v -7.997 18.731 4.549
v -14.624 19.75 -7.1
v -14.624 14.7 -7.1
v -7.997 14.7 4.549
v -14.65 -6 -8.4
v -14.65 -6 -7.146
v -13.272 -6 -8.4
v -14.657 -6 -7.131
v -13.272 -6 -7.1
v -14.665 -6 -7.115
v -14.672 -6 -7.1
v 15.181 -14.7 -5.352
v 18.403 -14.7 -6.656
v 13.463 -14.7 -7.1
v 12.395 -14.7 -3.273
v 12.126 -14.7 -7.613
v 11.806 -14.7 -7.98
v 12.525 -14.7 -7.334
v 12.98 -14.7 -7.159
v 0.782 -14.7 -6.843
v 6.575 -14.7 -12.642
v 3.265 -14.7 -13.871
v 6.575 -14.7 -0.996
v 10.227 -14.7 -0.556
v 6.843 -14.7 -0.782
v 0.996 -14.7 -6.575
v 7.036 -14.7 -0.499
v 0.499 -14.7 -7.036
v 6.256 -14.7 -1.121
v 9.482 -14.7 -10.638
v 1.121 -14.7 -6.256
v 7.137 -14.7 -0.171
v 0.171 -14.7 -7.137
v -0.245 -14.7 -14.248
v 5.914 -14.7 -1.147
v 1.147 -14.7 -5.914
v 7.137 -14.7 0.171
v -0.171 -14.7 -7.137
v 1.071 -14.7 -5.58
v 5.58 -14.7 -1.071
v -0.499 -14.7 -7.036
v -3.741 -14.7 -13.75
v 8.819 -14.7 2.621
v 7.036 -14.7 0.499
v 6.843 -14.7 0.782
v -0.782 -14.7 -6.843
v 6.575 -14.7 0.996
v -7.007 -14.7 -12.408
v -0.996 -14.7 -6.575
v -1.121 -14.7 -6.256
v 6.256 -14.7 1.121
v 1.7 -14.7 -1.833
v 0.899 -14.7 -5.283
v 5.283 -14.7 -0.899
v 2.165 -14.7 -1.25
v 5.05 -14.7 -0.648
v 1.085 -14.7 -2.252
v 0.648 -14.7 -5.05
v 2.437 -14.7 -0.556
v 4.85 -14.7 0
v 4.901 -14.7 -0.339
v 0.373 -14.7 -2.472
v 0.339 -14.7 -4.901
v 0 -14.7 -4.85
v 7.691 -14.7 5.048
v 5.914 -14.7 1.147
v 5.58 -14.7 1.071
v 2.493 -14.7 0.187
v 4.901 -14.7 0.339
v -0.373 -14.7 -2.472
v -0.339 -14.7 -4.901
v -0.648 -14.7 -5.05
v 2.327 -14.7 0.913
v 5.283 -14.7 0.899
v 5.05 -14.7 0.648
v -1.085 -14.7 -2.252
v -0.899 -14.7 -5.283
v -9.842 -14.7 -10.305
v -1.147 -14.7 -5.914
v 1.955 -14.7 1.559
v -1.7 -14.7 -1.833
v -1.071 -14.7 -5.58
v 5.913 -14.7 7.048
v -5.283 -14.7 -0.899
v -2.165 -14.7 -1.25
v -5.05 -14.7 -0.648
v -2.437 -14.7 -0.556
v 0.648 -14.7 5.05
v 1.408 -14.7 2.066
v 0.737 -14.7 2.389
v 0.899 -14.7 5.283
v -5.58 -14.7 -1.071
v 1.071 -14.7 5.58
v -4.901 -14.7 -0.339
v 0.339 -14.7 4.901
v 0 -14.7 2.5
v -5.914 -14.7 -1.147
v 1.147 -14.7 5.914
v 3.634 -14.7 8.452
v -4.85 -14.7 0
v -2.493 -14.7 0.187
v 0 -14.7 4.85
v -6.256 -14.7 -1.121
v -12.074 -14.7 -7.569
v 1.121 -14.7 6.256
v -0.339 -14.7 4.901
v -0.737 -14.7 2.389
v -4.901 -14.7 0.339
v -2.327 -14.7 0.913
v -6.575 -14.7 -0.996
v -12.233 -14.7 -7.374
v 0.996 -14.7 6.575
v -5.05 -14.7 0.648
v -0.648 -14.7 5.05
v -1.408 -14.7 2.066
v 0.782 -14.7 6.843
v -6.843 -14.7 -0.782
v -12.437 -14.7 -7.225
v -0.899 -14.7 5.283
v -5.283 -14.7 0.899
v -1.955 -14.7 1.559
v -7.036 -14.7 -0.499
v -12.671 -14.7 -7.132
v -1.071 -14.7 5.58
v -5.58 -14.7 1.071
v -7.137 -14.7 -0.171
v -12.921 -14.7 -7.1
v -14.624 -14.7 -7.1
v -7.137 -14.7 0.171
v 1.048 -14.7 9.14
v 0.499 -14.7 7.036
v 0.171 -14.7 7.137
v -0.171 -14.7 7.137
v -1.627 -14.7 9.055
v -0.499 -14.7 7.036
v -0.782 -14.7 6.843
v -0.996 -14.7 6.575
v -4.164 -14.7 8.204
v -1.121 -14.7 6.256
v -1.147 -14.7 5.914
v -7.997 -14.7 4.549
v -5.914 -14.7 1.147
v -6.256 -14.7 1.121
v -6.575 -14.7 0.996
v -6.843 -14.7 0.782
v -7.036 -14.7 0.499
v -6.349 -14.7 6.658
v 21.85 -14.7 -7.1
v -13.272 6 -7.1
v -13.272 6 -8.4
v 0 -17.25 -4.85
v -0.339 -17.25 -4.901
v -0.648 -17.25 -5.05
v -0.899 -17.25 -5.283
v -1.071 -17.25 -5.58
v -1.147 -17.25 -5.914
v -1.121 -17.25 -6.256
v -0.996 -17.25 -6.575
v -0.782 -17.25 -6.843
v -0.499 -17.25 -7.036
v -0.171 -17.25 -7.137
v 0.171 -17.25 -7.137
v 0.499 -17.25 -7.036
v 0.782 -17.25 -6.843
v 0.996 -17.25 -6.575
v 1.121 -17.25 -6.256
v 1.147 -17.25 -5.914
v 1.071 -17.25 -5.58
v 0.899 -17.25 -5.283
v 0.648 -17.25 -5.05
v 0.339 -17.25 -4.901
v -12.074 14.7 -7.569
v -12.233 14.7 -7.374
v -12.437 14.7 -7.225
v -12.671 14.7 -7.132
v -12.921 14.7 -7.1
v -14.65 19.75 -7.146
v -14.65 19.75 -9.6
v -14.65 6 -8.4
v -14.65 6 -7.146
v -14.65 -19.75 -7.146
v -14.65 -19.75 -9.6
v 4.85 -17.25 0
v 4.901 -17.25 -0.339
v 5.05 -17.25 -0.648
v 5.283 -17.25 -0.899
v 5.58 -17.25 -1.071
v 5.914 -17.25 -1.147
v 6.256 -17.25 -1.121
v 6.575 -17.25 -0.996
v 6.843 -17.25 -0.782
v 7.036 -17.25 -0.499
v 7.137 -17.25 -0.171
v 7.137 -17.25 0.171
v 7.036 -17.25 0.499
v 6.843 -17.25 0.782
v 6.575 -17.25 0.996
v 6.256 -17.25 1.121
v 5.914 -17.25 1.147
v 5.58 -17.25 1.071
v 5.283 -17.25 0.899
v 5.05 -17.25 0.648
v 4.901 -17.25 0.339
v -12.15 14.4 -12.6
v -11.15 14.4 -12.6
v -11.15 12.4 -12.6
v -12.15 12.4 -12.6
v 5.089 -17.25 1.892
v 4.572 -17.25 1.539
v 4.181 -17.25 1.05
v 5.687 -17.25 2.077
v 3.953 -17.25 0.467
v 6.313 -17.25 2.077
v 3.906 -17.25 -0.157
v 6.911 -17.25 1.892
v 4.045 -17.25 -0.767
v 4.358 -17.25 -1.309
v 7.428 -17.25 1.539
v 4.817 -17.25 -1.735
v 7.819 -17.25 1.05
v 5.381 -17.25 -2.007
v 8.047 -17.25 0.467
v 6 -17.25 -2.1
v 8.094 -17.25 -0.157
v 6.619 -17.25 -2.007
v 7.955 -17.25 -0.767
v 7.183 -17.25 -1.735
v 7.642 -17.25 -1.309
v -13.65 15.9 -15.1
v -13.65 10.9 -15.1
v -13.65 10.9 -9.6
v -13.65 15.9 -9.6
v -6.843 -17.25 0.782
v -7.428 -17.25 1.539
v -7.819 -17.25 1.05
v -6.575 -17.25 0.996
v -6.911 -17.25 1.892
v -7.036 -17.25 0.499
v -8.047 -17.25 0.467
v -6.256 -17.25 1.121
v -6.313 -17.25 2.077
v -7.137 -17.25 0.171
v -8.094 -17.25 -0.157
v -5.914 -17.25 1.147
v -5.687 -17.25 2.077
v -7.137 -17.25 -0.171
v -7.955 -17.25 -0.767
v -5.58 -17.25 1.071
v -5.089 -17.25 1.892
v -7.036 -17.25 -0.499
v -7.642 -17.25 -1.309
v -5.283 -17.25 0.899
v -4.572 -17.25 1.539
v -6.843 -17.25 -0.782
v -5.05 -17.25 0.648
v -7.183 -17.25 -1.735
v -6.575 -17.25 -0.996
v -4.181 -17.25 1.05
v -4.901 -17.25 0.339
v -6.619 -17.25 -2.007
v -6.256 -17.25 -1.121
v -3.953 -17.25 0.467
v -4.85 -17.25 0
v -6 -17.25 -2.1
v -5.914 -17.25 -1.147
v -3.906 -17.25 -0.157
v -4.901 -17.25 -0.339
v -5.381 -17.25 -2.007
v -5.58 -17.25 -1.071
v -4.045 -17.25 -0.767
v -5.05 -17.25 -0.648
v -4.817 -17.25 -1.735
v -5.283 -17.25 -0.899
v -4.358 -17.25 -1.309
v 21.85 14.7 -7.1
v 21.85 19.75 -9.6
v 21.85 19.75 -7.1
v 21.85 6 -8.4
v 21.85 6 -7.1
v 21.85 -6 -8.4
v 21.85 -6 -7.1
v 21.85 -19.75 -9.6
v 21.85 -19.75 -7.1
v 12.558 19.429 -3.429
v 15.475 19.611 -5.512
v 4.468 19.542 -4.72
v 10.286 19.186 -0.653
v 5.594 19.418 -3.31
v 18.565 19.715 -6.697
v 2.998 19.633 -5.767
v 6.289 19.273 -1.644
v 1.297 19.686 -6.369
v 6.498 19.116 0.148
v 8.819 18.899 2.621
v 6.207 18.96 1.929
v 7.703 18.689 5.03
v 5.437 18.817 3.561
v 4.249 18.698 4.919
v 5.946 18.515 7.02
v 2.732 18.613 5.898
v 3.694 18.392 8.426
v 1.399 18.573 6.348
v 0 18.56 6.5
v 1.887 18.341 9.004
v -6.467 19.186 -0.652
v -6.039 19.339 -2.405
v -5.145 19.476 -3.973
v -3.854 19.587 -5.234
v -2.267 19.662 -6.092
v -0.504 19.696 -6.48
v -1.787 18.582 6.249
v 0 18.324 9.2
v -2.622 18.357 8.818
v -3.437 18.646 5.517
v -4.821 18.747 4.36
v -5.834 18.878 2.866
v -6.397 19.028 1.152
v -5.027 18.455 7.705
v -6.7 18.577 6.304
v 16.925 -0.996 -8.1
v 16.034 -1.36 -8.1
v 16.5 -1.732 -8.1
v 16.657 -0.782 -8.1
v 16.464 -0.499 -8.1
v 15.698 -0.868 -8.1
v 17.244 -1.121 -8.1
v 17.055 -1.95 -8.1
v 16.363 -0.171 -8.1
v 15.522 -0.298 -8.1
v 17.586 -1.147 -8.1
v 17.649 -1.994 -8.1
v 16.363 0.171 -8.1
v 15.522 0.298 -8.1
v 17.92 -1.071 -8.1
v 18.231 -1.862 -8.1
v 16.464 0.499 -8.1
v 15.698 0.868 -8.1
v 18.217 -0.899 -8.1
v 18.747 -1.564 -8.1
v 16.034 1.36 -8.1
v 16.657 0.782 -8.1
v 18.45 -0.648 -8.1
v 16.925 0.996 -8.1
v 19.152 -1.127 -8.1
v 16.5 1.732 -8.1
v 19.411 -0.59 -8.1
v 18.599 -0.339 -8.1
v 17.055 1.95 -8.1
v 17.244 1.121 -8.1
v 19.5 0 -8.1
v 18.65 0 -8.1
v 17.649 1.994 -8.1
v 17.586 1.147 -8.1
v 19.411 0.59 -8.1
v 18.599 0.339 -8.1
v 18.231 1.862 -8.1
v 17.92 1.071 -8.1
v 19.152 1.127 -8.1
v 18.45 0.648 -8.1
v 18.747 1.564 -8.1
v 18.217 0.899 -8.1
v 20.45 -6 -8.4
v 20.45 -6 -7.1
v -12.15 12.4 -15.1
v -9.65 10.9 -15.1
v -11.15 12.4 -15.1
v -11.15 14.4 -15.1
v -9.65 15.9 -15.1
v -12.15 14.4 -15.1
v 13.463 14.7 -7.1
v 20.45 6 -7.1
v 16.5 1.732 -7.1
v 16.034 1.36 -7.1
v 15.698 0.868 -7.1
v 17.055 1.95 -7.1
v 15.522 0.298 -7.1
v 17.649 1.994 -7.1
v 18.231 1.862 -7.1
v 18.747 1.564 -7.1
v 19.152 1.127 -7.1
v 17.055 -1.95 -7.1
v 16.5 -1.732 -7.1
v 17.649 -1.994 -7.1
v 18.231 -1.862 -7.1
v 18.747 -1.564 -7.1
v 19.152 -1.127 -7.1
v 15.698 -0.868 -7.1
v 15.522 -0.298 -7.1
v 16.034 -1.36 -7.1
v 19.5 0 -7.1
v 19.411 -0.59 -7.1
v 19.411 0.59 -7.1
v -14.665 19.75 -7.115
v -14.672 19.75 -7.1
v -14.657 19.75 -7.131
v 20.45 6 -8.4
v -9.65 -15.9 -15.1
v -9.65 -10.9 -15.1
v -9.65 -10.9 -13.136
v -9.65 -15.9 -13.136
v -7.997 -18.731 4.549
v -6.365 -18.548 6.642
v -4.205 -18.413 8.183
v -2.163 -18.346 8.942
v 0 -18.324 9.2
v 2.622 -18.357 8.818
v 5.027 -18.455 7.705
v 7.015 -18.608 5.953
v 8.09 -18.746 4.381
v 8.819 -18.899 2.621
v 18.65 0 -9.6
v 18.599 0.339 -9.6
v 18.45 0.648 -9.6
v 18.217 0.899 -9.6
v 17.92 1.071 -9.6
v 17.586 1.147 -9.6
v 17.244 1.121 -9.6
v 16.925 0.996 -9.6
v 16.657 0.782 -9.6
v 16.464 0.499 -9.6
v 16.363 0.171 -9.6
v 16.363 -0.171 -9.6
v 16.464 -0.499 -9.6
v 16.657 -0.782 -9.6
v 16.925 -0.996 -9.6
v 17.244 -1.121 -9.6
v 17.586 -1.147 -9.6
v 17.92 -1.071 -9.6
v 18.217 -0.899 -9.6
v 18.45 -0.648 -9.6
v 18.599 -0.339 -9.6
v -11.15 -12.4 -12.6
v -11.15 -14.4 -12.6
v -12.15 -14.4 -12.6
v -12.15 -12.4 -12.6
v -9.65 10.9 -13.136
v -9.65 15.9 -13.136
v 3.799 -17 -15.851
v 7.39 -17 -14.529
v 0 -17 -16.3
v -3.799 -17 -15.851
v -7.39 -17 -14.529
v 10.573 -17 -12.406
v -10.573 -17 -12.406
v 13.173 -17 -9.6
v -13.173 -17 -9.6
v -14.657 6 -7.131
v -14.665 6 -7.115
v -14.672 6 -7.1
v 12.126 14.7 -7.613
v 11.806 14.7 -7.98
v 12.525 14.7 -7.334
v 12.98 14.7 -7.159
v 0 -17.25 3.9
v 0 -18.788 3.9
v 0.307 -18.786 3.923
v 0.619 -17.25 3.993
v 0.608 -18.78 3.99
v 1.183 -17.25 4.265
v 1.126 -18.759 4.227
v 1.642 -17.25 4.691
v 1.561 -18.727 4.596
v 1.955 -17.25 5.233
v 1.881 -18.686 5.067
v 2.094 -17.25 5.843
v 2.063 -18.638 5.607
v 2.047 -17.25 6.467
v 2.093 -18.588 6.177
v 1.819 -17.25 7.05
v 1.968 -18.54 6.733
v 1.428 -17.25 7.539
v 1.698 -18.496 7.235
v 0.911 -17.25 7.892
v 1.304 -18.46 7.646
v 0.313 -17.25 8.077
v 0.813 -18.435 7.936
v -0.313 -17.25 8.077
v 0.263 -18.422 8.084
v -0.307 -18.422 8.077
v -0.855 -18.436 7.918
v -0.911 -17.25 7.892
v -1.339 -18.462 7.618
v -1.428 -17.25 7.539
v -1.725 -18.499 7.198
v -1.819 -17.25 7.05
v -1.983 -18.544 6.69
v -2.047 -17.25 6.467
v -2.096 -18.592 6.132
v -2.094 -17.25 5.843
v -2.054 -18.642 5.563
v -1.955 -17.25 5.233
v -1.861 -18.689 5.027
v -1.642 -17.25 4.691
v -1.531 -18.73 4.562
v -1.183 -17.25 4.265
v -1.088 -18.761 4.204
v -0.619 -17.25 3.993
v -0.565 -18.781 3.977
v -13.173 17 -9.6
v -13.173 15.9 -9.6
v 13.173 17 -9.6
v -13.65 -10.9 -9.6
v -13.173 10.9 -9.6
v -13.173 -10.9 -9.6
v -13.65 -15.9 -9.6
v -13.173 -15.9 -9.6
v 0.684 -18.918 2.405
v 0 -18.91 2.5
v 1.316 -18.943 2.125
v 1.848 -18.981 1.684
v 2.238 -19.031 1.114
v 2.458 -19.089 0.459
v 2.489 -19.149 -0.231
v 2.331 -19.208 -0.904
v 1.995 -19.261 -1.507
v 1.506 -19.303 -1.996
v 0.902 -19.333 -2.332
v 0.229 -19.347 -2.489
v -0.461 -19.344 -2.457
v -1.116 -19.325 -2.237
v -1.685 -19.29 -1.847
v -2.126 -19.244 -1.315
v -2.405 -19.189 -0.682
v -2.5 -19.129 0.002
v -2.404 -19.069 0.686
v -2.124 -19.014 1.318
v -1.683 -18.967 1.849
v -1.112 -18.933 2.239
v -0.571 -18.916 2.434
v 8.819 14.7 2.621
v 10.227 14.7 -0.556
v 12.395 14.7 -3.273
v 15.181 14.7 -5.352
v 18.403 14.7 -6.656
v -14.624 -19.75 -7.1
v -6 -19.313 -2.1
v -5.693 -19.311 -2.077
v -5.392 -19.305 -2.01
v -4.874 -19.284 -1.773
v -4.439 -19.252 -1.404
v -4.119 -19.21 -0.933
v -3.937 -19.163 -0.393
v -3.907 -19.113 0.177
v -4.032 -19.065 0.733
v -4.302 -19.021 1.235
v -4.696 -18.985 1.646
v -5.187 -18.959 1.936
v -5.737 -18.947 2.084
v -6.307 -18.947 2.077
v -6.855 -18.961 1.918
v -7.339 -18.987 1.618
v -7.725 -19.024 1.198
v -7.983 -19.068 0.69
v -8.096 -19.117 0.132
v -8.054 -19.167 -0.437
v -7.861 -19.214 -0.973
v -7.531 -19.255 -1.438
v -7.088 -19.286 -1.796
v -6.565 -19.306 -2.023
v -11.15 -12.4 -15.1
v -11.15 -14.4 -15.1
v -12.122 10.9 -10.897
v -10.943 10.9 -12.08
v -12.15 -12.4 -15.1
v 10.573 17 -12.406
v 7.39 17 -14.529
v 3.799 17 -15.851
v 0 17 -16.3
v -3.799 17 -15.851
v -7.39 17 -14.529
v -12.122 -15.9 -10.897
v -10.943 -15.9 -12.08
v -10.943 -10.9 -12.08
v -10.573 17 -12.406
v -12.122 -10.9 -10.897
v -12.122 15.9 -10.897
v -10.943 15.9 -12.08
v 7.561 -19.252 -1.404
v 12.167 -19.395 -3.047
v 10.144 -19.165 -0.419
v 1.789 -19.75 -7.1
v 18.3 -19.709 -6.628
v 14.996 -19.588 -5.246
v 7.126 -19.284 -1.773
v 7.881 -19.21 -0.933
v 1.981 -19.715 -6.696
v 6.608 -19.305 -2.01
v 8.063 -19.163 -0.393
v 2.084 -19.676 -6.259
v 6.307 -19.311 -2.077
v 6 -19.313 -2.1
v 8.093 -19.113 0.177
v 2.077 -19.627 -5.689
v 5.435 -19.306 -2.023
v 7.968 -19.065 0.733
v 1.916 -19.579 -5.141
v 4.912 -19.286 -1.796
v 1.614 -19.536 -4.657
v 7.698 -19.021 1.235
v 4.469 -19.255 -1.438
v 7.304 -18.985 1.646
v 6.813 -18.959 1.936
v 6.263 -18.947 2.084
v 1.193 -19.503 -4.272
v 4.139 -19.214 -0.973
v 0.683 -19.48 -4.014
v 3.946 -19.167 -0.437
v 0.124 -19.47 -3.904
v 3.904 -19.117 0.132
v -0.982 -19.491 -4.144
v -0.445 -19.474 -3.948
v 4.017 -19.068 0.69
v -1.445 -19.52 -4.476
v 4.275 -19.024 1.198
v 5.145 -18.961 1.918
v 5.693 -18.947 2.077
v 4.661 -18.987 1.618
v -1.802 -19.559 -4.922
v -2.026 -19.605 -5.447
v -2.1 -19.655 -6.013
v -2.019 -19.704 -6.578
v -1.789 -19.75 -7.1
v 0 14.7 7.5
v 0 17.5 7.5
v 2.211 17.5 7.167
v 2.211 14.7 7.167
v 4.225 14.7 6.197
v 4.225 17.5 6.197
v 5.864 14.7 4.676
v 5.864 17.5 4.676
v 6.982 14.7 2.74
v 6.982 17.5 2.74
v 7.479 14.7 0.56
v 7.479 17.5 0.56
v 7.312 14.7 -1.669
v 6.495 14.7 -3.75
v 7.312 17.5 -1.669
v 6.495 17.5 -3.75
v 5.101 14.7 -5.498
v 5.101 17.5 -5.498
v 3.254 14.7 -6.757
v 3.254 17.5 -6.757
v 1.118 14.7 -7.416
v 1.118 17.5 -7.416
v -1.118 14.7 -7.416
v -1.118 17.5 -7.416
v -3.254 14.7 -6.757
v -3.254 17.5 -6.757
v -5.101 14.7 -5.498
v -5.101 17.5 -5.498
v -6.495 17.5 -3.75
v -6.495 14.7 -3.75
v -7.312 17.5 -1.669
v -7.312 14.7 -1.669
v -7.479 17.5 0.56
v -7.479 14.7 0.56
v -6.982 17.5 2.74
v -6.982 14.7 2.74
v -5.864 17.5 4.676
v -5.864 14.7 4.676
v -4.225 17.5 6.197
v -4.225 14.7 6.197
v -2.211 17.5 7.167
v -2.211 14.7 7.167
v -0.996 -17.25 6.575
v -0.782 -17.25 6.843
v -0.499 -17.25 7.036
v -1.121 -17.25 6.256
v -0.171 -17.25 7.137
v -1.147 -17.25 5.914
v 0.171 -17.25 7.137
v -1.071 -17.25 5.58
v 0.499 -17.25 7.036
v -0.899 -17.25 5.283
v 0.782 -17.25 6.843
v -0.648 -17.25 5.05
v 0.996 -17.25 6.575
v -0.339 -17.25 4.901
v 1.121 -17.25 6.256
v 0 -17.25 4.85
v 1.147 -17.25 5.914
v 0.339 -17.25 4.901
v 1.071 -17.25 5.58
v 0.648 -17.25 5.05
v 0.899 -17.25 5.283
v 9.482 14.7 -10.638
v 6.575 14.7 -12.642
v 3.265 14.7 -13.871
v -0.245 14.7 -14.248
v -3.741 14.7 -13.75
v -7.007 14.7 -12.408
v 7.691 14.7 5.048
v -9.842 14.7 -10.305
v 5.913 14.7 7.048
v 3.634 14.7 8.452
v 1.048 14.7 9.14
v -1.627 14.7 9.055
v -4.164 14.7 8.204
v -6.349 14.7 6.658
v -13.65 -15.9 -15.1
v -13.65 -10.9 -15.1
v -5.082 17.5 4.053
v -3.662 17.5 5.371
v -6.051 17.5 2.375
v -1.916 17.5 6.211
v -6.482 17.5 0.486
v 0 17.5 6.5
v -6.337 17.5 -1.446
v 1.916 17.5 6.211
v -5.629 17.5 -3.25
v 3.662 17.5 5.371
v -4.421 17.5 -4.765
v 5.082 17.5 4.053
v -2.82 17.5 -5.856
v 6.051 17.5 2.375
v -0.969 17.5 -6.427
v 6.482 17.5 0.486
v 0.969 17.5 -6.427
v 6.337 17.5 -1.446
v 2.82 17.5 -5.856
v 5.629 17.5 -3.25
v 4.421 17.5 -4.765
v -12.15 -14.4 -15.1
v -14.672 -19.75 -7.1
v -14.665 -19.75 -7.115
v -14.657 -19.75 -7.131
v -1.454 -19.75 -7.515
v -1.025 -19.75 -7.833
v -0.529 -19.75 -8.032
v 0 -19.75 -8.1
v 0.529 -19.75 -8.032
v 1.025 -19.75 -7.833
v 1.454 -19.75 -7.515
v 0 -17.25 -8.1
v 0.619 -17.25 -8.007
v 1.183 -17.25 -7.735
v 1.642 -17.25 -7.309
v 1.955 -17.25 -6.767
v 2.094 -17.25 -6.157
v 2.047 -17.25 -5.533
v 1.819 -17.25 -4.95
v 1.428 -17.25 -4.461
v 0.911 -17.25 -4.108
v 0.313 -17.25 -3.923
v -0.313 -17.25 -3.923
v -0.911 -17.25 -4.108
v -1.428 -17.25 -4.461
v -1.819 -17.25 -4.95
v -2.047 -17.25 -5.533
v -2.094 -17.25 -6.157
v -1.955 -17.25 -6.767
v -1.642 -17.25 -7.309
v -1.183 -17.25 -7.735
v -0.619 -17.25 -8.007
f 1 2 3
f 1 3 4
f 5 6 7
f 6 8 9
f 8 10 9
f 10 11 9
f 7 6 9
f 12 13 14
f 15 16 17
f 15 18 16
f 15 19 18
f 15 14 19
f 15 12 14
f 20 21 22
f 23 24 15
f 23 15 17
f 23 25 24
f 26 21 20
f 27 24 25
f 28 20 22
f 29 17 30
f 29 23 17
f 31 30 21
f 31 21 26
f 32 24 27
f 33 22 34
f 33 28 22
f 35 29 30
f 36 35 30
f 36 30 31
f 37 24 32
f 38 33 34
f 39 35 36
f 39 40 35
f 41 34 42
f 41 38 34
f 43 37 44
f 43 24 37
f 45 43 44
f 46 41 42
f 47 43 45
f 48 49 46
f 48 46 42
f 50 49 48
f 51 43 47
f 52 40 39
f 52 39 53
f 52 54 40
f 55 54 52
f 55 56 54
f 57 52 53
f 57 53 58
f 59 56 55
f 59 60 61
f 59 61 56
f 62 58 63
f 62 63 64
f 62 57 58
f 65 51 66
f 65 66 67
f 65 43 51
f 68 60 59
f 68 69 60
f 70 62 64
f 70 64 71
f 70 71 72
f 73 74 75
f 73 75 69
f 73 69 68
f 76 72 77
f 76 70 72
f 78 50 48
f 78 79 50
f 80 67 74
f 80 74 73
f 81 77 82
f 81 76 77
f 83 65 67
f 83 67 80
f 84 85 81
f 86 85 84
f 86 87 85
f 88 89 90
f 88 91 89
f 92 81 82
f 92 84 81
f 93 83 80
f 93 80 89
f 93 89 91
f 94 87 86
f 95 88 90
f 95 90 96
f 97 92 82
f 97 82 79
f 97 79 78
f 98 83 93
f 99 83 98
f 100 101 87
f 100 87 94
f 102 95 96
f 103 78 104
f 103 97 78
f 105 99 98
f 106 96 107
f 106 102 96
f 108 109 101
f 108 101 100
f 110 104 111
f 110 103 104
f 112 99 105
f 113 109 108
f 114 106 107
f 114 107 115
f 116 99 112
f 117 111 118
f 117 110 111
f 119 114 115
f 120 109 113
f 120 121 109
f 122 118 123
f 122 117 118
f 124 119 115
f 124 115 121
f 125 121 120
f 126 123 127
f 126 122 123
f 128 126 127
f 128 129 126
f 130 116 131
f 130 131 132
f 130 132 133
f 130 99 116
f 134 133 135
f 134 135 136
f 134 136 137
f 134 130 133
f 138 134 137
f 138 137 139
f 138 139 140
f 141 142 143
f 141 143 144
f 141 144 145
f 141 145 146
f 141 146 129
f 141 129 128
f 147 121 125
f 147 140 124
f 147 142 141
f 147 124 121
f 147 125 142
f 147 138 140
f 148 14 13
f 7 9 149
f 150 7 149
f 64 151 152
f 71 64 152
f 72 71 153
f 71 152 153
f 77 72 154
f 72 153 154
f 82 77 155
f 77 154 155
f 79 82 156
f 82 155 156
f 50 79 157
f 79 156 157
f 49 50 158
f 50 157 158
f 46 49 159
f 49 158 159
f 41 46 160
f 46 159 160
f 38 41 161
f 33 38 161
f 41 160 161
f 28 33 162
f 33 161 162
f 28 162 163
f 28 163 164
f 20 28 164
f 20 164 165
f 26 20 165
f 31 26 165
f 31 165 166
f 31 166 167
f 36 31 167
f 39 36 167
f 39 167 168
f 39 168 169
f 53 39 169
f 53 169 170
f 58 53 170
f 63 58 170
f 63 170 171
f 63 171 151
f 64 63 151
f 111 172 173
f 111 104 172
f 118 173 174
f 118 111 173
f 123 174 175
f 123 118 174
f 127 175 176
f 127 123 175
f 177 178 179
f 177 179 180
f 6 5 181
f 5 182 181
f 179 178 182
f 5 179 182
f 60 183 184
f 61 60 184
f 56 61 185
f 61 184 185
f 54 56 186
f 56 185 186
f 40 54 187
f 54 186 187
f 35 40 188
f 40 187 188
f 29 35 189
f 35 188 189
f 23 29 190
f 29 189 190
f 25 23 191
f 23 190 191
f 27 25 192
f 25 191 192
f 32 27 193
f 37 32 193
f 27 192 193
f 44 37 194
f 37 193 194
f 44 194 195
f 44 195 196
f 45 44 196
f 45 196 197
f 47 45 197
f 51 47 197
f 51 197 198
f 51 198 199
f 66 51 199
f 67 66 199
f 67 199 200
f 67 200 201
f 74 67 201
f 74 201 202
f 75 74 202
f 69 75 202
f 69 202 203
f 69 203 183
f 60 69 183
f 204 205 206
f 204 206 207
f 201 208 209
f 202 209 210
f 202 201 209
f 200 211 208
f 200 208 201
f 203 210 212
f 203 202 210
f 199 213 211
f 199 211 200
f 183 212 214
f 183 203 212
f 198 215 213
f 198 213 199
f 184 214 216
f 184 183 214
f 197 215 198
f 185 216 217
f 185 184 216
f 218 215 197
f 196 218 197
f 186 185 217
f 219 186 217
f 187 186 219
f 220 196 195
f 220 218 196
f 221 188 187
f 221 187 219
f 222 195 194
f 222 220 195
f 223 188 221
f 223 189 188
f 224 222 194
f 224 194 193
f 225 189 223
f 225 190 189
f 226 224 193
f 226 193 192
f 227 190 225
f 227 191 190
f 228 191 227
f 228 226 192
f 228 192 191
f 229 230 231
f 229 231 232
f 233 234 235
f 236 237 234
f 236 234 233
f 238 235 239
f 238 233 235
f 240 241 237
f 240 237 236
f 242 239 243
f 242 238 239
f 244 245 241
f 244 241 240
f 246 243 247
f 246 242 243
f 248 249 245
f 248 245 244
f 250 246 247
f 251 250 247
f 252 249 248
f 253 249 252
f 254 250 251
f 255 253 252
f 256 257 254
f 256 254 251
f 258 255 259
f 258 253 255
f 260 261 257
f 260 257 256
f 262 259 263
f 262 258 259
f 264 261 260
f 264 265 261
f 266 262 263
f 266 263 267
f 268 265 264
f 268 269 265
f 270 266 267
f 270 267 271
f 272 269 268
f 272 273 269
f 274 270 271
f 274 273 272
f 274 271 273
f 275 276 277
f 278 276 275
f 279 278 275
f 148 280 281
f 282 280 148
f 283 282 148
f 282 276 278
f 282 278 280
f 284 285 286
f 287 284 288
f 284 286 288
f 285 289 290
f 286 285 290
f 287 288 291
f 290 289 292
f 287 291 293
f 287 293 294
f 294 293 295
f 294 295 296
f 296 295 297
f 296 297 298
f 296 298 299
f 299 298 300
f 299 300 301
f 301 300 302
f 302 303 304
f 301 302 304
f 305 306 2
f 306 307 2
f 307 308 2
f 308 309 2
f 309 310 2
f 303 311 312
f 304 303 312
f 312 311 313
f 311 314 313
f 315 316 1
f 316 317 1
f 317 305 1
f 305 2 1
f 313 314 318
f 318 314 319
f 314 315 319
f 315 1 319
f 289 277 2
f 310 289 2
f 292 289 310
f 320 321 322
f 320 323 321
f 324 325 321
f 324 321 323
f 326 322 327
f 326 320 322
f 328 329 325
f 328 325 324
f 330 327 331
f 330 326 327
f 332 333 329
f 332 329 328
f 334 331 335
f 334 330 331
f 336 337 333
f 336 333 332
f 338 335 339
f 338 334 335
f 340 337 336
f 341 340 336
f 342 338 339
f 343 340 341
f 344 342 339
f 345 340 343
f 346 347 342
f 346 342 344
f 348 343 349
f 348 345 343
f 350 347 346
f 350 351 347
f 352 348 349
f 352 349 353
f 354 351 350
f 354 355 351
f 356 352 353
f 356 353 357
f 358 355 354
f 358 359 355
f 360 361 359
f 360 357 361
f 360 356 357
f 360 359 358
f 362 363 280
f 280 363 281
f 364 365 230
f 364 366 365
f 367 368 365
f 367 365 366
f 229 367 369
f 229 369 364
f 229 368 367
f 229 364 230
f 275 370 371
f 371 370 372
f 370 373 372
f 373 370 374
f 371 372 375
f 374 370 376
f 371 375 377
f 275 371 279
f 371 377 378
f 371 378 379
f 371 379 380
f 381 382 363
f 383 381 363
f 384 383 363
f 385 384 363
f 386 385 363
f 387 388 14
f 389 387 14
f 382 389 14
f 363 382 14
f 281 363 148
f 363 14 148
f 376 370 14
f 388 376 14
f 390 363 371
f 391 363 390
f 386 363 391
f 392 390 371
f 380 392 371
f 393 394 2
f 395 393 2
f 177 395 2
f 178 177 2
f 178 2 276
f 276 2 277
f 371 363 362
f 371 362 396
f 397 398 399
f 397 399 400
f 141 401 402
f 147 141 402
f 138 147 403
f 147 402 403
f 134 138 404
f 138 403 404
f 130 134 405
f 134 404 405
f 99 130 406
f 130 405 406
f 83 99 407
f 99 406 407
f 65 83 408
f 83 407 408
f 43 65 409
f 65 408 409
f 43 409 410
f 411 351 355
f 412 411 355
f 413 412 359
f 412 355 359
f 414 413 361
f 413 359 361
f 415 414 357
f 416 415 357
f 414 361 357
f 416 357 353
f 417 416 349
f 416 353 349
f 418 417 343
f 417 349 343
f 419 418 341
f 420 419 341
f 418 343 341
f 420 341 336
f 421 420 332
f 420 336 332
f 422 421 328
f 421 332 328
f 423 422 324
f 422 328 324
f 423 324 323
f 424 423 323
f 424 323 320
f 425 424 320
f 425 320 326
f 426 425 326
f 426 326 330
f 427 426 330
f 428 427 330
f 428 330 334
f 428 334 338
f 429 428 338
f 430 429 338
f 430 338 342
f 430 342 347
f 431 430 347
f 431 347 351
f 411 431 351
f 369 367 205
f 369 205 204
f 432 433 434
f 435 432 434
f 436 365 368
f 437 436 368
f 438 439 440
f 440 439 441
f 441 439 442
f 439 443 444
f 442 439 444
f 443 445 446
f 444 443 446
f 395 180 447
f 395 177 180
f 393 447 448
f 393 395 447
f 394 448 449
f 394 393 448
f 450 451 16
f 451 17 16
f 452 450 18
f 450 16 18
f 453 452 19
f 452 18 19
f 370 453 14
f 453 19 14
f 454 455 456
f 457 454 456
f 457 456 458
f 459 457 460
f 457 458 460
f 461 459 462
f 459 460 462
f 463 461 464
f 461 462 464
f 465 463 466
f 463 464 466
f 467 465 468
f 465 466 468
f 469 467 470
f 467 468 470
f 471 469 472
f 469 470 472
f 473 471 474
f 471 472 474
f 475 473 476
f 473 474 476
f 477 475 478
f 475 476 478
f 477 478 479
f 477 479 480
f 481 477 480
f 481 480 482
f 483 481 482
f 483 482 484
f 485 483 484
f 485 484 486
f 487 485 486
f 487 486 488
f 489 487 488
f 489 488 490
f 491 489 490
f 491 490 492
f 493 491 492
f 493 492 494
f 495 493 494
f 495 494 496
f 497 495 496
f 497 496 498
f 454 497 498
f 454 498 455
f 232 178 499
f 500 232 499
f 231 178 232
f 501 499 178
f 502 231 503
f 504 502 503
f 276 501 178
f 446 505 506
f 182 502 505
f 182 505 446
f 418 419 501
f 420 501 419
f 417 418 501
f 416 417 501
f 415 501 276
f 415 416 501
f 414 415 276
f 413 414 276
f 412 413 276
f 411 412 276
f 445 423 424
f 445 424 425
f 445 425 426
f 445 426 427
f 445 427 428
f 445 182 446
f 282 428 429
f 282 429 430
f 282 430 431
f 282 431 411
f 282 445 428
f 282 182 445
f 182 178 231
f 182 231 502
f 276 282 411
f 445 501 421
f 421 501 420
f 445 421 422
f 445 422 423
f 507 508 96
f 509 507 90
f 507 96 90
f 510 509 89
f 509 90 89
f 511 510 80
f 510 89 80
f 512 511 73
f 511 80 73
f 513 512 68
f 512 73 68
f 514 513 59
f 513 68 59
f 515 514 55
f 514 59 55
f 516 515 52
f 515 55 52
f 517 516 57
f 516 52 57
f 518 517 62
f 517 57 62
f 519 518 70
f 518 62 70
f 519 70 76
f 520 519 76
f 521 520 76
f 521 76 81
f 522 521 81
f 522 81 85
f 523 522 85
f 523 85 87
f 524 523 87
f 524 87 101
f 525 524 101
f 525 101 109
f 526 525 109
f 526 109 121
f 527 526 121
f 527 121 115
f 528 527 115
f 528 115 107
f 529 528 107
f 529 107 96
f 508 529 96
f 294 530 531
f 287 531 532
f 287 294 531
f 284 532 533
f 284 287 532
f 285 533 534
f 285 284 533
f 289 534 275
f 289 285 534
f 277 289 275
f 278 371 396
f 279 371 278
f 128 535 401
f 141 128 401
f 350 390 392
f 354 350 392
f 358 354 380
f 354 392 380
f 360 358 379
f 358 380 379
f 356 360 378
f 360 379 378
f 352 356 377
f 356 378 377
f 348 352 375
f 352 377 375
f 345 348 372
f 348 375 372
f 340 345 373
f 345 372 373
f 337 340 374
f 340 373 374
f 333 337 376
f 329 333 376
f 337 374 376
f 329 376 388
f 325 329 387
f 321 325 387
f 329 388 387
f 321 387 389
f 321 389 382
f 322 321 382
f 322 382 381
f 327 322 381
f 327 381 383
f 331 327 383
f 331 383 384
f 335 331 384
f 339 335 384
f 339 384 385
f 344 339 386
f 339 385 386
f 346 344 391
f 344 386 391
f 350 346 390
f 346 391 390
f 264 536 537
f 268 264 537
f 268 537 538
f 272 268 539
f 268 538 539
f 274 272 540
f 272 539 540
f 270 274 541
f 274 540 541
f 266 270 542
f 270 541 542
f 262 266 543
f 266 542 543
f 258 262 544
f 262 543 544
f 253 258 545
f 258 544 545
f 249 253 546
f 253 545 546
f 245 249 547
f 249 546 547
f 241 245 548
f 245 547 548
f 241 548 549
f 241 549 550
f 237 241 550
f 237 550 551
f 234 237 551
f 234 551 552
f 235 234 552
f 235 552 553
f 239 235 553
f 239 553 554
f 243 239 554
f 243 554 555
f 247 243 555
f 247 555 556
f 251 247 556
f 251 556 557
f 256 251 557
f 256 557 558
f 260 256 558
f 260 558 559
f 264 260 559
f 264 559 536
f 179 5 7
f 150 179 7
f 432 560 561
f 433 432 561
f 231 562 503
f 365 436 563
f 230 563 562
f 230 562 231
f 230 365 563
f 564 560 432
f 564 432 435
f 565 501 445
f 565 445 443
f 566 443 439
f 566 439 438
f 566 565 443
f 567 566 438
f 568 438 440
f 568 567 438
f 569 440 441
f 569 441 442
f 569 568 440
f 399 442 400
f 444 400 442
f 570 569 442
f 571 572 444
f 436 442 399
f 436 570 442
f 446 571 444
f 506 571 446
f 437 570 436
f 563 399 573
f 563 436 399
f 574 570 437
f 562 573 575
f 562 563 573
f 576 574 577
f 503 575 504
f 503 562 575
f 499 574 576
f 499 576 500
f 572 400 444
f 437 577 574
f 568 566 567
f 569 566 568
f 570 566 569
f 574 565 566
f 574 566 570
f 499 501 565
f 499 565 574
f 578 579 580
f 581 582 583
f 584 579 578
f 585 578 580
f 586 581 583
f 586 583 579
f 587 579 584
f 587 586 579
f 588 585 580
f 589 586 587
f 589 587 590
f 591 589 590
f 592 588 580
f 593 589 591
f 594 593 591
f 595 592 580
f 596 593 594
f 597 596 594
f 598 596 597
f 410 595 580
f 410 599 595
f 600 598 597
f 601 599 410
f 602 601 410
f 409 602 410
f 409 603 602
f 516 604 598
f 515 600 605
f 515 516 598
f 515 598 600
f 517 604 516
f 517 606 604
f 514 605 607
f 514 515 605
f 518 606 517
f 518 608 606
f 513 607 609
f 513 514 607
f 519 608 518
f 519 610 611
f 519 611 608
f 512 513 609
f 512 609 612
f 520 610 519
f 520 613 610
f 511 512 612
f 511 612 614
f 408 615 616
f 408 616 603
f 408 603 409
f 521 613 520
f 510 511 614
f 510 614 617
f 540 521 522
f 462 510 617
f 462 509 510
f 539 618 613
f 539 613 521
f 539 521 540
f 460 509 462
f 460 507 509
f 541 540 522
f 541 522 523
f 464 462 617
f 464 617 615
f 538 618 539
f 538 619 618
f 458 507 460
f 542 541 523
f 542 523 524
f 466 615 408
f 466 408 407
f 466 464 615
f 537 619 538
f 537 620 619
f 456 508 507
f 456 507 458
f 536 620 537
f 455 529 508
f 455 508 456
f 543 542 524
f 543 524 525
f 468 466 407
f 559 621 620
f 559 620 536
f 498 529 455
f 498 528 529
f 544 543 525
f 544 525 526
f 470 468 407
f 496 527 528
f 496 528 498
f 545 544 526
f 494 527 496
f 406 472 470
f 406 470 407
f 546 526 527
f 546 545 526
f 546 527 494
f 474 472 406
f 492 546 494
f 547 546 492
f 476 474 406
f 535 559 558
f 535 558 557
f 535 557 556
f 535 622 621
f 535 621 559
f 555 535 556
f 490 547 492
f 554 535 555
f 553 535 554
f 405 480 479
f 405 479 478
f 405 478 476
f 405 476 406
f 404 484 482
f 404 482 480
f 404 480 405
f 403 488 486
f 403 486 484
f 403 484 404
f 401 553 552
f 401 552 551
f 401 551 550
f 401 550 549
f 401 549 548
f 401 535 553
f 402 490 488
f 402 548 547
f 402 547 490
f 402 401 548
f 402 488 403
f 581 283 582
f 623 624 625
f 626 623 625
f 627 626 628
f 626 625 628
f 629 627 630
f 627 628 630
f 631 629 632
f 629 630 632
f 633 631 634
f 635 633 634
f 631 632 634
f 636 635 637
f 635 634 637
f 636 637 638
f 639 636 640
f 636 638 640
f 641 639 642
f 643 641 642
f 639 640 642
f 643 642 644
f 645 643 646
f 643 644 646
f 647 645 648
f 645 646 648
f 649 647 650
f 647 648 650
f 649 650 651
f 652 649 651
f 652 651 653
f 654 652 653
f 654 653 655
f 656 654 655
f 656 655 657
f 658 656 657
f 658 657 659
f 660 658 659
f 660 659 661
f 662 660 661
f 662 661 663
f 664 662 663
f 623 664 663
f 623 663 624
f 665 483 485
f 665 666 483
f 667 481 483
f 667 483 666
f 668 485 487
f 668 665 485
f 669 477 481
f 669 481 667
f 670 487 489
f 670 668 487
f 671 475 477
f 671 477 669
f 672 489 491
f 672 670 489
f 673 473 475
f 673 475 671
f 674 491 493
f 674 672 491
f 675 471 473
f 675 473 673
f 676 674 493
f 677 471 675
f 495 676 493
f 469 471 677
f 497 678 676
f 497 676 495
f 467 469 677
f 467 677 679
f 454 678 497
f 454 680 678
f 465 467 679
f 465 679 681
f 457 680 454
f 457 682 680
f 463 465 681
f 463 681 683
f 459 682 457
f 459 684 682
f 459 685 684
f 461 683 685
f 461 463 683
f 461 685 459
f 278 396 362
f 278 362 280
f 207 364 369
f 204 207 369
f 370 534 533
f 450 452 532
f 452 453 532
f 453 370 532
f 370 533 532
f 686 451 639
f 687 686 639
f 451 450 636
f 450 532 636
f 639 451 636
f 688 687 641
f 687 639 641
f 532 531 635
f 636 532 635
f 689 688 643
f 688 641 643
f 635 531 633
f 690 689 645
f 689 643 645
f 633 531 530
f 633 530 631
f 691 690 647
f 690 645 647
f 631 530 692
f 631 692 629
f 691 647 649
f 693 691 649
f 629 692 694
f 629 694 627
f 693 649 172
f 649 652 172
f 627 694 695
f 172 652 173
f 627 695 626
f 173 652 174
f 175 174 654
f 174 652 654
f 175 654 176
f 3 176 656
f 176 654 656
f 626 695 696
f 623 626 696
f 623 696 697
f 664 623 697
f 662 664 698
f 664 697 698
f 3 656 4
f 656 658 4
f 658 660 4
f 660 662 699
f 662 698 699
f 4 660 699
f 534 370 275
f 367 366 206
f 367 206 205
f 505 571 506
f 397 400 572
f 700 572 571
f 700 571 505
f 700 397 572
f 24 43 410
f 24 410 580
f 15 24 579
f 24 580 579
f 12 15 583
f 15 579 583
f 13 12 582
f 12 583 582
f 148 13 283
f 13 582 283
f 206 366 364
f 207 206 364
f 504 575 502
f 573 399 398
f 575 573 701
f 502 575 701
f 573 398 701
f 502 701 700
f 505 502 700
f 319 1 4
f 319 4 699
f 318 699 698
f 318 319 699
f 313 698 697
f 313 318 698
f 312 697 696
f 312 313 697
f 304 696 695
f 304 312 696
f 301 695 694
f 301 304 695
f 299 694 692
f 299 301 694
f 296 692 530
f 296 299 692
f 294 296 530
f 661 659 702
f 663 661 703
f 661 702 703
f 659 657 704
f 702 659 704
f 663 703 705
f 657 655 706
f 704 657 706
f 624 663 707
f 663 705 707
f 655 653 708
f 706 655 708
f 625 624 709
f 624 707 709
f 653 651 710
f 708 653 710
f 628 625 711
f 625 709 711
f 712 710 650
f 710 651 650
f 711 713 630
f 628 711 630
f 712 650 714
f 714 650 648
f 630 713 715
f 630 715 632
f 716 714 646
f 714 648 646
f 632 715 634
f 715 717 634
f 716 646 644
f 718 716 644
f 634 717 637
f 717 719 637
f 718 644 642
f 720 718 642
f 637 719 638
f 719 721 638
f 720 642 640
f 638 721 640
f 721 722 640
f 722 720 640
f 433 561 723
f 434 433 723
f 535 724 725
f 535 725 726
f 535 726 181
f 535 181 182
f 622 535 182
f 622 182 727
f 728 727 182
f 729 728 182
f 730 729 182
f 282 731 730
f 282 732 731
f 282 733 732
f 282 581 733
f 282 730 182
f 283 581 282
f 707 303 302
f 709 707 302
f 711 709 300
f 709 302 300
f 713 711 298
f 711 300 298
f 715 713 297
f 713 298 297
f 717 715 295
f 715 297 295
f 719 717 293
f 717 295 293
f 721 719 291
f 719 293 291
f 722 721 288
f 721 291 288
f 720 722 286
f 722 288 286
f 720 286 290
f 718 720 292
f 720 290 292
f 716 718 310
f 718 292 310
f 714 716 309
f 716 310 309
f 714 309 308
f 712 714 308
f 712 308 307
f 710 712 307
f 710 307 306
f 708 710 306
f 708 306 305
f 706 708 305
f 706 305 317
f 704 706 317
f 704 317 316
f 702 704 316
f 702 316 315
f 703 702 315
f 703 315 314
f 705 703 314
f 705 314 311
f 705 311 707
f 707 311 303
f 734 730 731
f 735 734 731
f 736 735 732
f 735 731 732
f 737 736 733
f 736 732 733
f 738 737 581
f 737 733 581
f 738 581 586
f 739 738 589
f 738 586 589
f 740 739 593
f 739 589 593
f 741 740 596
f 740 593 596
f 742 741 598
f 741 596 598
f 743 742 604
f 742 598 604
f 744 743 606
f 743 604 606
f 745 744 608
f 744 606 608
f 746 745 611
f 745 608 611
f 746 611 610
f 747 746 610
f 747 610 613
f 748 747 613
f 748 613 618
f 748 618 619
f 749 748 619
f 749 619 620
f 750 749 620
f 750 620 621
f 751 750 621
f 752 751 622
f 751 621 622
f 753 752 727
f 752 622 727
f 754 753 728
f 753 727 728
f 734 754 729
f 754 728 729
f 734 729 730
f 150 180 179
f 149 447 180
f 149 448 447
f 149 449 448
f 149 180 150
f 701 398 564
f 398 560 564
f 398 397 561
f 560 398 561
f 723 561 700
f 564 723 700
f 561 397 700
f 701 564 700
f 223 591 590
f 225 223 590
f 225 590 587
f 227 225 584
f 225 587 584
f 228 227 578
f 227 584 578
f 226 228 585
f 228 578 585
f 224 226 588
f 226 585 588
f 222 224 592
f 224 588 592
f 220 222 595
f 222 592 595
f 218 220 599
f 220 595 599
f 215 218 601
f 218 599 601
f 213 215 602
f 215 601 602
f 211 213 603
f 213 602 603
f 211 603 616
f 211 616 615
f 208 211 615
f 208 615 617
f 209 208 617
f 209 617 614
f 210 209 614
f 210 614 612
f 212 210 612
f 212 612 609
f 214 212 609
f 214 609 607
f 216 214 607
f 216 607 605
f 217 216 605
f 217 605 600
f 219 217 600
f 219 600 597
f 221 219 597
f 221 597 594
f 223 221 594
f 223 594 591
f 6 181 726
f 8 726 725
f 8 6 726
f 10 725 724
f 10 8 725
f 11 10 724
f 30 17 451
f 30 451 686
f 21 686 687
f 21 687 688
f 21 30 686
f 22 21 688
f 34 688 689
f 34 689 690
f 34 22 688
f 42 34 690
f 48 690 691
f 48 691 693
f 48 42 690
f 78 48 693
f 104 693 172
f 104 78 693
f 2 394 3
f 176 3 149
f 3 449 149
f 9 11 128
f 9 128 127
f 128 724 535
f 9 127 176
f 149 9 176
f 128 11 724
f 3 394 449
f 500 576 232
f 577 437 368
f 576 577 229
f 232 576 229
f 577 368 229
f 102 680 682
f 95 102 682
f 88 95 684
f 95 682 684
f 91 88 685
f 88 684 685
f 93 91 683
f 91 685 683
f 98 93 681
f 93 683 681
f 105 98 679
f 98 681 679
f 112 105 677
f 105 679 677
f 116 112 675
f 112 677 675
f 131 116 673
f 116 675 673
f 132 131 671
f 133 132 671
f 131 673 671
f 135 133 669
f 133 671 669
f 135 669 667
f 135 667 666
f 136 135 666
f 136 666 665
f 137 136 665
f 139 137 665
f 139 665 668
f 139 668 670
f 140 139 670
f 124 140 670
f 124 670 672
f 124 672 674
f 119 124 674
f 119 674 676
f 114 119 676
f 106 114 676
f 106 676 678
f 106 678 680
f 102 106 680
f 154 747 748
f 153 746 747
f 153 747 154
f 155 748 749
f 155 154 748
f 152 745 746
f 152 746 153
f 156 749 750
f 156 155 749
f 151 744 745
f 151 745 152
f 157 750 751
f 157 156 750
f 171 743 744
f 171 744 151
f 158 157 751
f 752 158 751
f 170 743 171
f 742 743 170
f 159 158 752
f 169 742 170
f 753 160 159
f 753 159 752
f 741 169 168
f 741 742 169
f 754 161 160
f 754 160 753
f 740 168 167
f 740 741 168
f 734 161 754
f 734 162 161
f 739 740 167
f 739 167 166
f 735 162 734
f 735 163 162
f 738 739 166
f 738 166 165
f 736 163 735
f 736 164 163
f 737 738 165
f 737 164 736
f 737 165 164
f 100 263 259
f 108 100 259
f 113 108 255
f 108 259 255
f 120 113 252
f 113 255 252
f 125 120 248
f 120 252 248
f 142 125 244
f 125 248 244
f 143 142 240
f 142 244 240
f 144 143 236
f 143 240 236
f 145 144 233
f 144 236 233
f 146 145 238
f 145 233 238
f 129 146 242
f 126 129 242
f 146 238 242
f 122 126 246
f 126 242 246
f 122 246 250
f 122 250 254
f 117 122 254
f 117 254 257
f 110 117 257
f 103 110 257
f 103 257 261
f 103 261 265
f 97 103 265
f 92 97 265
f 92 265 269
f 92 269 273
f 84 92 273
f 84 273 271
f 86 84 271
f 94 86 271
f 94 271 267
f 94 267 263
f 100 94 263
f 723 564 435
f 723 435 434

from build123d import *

# Parameters (mm, degrees)
SKETCH_1_R               = 16.3
EXTRUDE_1_DEPTH          = 19.75
SKETCH_2_W               = 36.5
SKETCH_2_H               = 2.5
EXTRUDE_2_DEPTH          = 39.5
SKETCH_3_W               = 44.844436064
SKETCH_3_H               = 25.506740045
CUT_EXTRUDE_1_DEPTH      = 50
EXTRUDE_3_DEPTH          = 5.05
SKETCH_5_R               = 14.25
CUT_EXTRUDE_2_DEPTH      = 29.4
SKETCH_6_R               = 2.5
CUT_EXTRUDE_3_DEPTH      = 44.930797853
CUT_EXTRUDE_6_REACH      = 49.993
SKETCH_9_R               = 7.5
SKETCH_12_R              = 1.15
CUT_EXTRUDE_9_DEPTH      = 34.662664779
SKETCH_13_R              = 2
CUT_EXTRUDE_10_DEPTH     = 1
SKETCH_14_W              = 2.8
SKETCH_14_H              = 12
CUT_EXTRUDE_11_DEPTH     = 1.3
SKETCH_15_W              = 2.8
SKETCH_15_H              = 12
CUT_EXTRUDE_12_DEPTH     = 1.3
EXTRUDE_5_REACH          = 40.183
EXTRUDE_5_END_RADIUS     = 16.3
SKETCH_16_W              = 4
SKETCH_16_H              = 5
SKETCH_17_W              = 1
SKETCH_17_H              = 2
CUT_EXTRUDE_13_DEPTH     = 2.5
SKETCH_19_R              = 8.51898124
SKETCH_19_R_2            = 6.5
EXTRUDE_6_DEPTH          = 2.25
CUT_EXTRUDE_18_REACH     = 49.993
SKETCH_20_R              = 1.15
PATTERN_CIRCULAR_1_COUNT = 4
CUT_EXTRUDE_8_DEPTH      = 45.587021654
SKETCH_18_W              = 26.346157216
SKETCH_18_H              = 2.75
CUT_EXTRUDE_16_DEPTH     = 12.5
FILLET_1_R               = 2
FILLET_2_R               = 1
SKETCH_21_R              = 2.1
CUT_EXTRUDE_19_DEPTH     = 2.5


with BuildPart() as part:
    # 草图1 → 凸台-拉伸1 (new, symmetric)
    with BuildSketch(Plane(origin=(0, 0, 0), x_dir=(1, 0, 0), z_dir=(0, 1, 0))):
        with Locations(Location((0, 0, 0), (0, 0, 270))):
            Circle(SKETCH_1_R)
    extrude(amount=EXTRUDE_1_DEPTH, both=True)

    # 草图2 → 凸台-拉伸2 (add, through all)
    with BuildSketch(Plane.XZ.offset(19.75)):
        with Locations((3.6, -8.35)):
            Rectangle(SKETCH_2_W, SKETCH_2_H)
    extrude(amount=-EXTRUDE_2_DEPTH)

    # 草图3 → 切除-拉伸1 (cut)
    with BuildSketch(Plane.XZ.offset(19.75)):
        with Locations((-0.572218032, 5.653370022)):
            Rectangle(SKETCH_3_W, SKETCH_3_H)
    extrude(amount=-CUT_EXTRUDE_1_DEPTH, mode=Mode.SUBTRACT)

    # 草图4 → 凸台-拉伸3 (add)
    with BuildSketch(Plane.XZ.offset(19.75)):
        with BuildLine():
            Line((-14.65, -7.146152811), (-7.996542478, 4.549209646))
            ThreePointArc((-7.996542478, 4.549209646), (1.047927533, 9.140122969), (8.818653972, 2.621324497))
            ThreePointArc((8.818653972, 2.621324497), (13.721037439, -4.401937543), (21.85, -7.1))
            Line((21.85, -7.1), (-14.65, -7.146152811))
        make_face()
    extrude_3 = extrude(amount=-EXTRUDE_3_DEPTH)

    # 镜向1: 凸台-拉伸3 across plane
    add(extrude_3.mirror(Plane.ZX))

    # 草图5 → 切除-拉伸2 (cut)
    with BuildSketch(Plane(origin=(0, -14.7, 0), x_dir=(1, 0, 0), z_dir=(0, 1, 0))):
        Circle(SKETCH_5_R)
    extrude(amount=CUT_EXTRUDE_2_DEPTH, mode=Mode.SUBTRACT)

    # 草图6 → 切除-拉伸3 (cut, through all)
    with BuildSketch(Plane(origin=(0, -14.7, 0), x_dir=(1, 0, 0), z_dir=(0, 1, 0))):
        with Locations(Location((0, 0, 0), (0, 0, 270))):
            Circle(SKETCH_6_R)
    extrude(amount=-CUT_EXTRUDE_3_DEPTH, mode=Mode.SUBTRACT)

    # 草图9 → 切除-拉伸6 (cut, up to next)
    with BuildSketch(Plane(origin=(0, 19.75, 0), x_dir=(1, 0, 0), z_dir=(0, 1, 0)), mode=Mode.PRIVATE) as cut_extrude_6_sk1:
        with Locations(Location((0, 0, 0), (0, 0, 270))):
            Circle(SKETCH_9_R)
    cut_extrude_6_tool1 = extrude(cut_extrude_6_sk1.sketch, amount=-CUT_EXTRUDE_6_REACH, mode=Mode.PRIVATE) & part.part
    add(cut_extrude_6_tool1.solids().sort_by_distance((0, 19.75, 0))[0], mode=Mode.SUBTRACT)

    # 草图12 → 切除-拉伸9 (cut, through all)
    with BuildSketch(Plane.XY.offset(-7.1)):
        with Locations((17.5, 0)):
            Circle(SKETCH_12_R)
    extrude(amount=-CUT_EXTRUDE_9_DEPTH, mode=Mode.SUBTRACT)

    # 草图13 → 切除-拉伸10 (cut)
    with BuildSketch(Plane.XY.offset(-7.1)):
        with Locations((17.5, 0)):
            Circle(SKETCH_13_R)
    extrude(amount=-CUT_EXTRUDE_10_DEPTH, mode=Mode.SUBTRACT)

    # 草图14 → 切除-拉伸11 (cut)
    with BuildSketch(Plane.XY.offset(-7.1)):
        with Locations((21.85, 0)):
            Rectangle(SKETCH_14_W, SKETCH_14_H)
    extrude(amount=-CUT_EXTRUDE_11_DEPTH, mode=Mode.SUBTRACT)

    # 草图15 → 切除-拉伸12 (cut)
    with BuildSketch(Plane.XY.offset(-7.1)):
        with Locations((-14.672423113, 0)):
            Rectangle(SKETCH_15_W, SKETCH_15_H)
    extrude(amount=-CUT_EXTRUDE_12_DEPTH, mode=Mode.SUBTRACT)

    # 凸台-拉伸5: up to this cylinder (the profile starts outside it)
    extrude_5_end = Plane(origin=(0, 13.4, 0), z_dir=(0, -1, 0)) * Cylinder(EXTRUDE_5_END_RADIUS, 113.966, mode=Mode.PRIVATE)
    # 草图16 → 凸台-拉伸5 (add, up to the surface)
    with BuildSketch(Plane(origin=(0, 0, -15.1), x_dir=(-1, 0, 0), z_dir=(0, 0, -1)), mode=Mode.PRIVATE) as extrude_5_sk1:
        with Locations((11.65, 13.4)):
            Rectangle(SKETCH_16_W, SKETCH_16_H)
    extrude_5_tool1 = extrude(extrude_5_sk1.sketch, amount=-EXTRUDE_5_REACH, mode=Mode.PRIVATE) - extrude_5_end
    extrude_5 = extrude_5_tool1.solids().sort_by_distance((-11.65, 13.4, -15.1))[0]
    add(extrude_5)

    # 镜向4: 凸台-拉伸5 across plane
    add(extrude_5.mirror(Plane.ZX))

    # 草图17 → 切除-拉伸13 (cut)
    with BuildSketch(Plane(origin=(0, 0, -15.1), x_dir=(-1, 0, 0), z_dir=(0, 0, -1))):
        with Locations((11.65, 13.4)):
            Rectangle(SKETCH_17_W, SKETCH_17_H)
    cut_extrude_13 = extrude(amount=-CUT_EXTRUDE_13_DEPTH, mode=Mode.SUBTRACT)

    # 镜向5: 切除-拉伸13 across plane
    add(cut_extrude_13.mirror(Plane.ZX), mode=Mode.SUBTRACT)

    # 草图19 → 凸台-拉伸6 (add)
    with BuildSketch(Plane(origin=(0, 19.75, 0), x_dir=(1, 0, 0), z_dir=(0, 1, 0))):
        Circle(SKETCH_19_R)
        with Locations(Location((0, 0, 0), (0, 0, 270))):
            Circle(SKETCH_19_R_2, mode=Mode.SUBTRACT)
    extrude(amount=-EXTRUDE_6_DEPTH)

    # 草图20 → 切除-拉伸18 (cut, up to next)
    with BuildSketch(Plane.XZ.offset(19.75), mode=Mode.PRIVATE) as cut_extrude_18_sk1:
        with Locations(Location((0, 6, 0), (0, 0, 270))):
            Circle(SKETCH_20_R)
    cut_extrude_18_tool1 = extrude(cut_extrude_18_sk1.sketch, amount=-CUT_EXTRUDE_18_REACH, mode=Mode.PRIVATE) & part.part
    cut_extrude_18 = cut_extrude_18_tool1.solids().sort_by_distance((0, -19.75, 6))[0]
    add(cut_extrude_18, mode=Mode.SUBTRACT)

    # 阵列(圆周)1: 切除-拉伸18 ×4 about axis
    pattern_circular_1_axis = Axis((0, 0, 0), (0, 1, 0))
    for i in range(1, PATTERN_CIRCULAR_1_COUNT):
        add(cut_extrude_18.rotate(pattern_circular_1_axis, i * 360 / PATTERN_CIRCULAR_1_COUNT), mode=Mode.SUBTRACT)

    # 草图7 → 切除-拉伸8 (cut, through all)
    with BuildSketch(Plane.ZY.offset(14.65)):
        Polygon((-7.1, 19.75), (9.2, 18.323934785), (9.2, 19.75), align=None)
    cut_extrude_8 = extrude(amount=-CUT_EXTRUDE_8_DEPTH, mode=Mode.SUBTRACT)

    # 镜向3: 切除-拉伸8 across plane
    add(cut_extrude_8.mirror(Plane.ZX), mode=Mode.SUBTRACT)

    # 草图18 → 切除-拉伸16 (cut)
    with BuildSketch(Plane(origin=(0, 0, -9.6), x_dir=(-1, 0, 0), z_dir=(0, 0, -1))):
        with Locations((0, 18.375)):
            Rectangle(SKETCH_18_W, SKETCH_18_H)
    cut_extrude_16 = extrude(amount=CUT_EXTRUDE_16_DEPTH, mode=Mode.SUBTRACT)

    # 镜向6: 切除-拉伸16 across plane
    add(cut_extrude_16.mirror(Plane.ZX), mode=Mode.SUBTRACT)

    # 圆角1
    fillet_1_edges = [part.edges().sort_by_distance(p)[0] for p in [
        (12.355262037, 0, -7.1),
    ]]
    fillet(fillet_1_edges, radius=FILLET_1_R)

    # 圆角2
    fillet_2_edges = [part.edges().sort_by_distance(p)[0] for p in [
        (-12.355262037, 0, -7.1),
    ]]
    fillet(fillet_2_edges, radius=FILLET_2_R)

    # 草图21 → 切除-拉伸19 (cut)
    with BuildSketch(Plane.XZ.offset(19.75)):
        with Locations(Location((0, 6, 0), (0, 0, 270))):
            Circle(SKETCH_21_R)
        with Locations(Location((-6, 0, 0), (0, 0, 270))):
            Circle(SKETCH_21_R)
        with Locations(Location((6, 0, 0), (0, 0, 270))):
            Circle(SKETCH_21_R)
        with Locations(Location((0, -6, 0), (0, 0, 270))):
            Circle(SKETCH_21_R)
    extrude(amount=-CUT_EXTRUDE_19_DEPTH, mode=Mode.SUBTRACT)


solid = part.part
